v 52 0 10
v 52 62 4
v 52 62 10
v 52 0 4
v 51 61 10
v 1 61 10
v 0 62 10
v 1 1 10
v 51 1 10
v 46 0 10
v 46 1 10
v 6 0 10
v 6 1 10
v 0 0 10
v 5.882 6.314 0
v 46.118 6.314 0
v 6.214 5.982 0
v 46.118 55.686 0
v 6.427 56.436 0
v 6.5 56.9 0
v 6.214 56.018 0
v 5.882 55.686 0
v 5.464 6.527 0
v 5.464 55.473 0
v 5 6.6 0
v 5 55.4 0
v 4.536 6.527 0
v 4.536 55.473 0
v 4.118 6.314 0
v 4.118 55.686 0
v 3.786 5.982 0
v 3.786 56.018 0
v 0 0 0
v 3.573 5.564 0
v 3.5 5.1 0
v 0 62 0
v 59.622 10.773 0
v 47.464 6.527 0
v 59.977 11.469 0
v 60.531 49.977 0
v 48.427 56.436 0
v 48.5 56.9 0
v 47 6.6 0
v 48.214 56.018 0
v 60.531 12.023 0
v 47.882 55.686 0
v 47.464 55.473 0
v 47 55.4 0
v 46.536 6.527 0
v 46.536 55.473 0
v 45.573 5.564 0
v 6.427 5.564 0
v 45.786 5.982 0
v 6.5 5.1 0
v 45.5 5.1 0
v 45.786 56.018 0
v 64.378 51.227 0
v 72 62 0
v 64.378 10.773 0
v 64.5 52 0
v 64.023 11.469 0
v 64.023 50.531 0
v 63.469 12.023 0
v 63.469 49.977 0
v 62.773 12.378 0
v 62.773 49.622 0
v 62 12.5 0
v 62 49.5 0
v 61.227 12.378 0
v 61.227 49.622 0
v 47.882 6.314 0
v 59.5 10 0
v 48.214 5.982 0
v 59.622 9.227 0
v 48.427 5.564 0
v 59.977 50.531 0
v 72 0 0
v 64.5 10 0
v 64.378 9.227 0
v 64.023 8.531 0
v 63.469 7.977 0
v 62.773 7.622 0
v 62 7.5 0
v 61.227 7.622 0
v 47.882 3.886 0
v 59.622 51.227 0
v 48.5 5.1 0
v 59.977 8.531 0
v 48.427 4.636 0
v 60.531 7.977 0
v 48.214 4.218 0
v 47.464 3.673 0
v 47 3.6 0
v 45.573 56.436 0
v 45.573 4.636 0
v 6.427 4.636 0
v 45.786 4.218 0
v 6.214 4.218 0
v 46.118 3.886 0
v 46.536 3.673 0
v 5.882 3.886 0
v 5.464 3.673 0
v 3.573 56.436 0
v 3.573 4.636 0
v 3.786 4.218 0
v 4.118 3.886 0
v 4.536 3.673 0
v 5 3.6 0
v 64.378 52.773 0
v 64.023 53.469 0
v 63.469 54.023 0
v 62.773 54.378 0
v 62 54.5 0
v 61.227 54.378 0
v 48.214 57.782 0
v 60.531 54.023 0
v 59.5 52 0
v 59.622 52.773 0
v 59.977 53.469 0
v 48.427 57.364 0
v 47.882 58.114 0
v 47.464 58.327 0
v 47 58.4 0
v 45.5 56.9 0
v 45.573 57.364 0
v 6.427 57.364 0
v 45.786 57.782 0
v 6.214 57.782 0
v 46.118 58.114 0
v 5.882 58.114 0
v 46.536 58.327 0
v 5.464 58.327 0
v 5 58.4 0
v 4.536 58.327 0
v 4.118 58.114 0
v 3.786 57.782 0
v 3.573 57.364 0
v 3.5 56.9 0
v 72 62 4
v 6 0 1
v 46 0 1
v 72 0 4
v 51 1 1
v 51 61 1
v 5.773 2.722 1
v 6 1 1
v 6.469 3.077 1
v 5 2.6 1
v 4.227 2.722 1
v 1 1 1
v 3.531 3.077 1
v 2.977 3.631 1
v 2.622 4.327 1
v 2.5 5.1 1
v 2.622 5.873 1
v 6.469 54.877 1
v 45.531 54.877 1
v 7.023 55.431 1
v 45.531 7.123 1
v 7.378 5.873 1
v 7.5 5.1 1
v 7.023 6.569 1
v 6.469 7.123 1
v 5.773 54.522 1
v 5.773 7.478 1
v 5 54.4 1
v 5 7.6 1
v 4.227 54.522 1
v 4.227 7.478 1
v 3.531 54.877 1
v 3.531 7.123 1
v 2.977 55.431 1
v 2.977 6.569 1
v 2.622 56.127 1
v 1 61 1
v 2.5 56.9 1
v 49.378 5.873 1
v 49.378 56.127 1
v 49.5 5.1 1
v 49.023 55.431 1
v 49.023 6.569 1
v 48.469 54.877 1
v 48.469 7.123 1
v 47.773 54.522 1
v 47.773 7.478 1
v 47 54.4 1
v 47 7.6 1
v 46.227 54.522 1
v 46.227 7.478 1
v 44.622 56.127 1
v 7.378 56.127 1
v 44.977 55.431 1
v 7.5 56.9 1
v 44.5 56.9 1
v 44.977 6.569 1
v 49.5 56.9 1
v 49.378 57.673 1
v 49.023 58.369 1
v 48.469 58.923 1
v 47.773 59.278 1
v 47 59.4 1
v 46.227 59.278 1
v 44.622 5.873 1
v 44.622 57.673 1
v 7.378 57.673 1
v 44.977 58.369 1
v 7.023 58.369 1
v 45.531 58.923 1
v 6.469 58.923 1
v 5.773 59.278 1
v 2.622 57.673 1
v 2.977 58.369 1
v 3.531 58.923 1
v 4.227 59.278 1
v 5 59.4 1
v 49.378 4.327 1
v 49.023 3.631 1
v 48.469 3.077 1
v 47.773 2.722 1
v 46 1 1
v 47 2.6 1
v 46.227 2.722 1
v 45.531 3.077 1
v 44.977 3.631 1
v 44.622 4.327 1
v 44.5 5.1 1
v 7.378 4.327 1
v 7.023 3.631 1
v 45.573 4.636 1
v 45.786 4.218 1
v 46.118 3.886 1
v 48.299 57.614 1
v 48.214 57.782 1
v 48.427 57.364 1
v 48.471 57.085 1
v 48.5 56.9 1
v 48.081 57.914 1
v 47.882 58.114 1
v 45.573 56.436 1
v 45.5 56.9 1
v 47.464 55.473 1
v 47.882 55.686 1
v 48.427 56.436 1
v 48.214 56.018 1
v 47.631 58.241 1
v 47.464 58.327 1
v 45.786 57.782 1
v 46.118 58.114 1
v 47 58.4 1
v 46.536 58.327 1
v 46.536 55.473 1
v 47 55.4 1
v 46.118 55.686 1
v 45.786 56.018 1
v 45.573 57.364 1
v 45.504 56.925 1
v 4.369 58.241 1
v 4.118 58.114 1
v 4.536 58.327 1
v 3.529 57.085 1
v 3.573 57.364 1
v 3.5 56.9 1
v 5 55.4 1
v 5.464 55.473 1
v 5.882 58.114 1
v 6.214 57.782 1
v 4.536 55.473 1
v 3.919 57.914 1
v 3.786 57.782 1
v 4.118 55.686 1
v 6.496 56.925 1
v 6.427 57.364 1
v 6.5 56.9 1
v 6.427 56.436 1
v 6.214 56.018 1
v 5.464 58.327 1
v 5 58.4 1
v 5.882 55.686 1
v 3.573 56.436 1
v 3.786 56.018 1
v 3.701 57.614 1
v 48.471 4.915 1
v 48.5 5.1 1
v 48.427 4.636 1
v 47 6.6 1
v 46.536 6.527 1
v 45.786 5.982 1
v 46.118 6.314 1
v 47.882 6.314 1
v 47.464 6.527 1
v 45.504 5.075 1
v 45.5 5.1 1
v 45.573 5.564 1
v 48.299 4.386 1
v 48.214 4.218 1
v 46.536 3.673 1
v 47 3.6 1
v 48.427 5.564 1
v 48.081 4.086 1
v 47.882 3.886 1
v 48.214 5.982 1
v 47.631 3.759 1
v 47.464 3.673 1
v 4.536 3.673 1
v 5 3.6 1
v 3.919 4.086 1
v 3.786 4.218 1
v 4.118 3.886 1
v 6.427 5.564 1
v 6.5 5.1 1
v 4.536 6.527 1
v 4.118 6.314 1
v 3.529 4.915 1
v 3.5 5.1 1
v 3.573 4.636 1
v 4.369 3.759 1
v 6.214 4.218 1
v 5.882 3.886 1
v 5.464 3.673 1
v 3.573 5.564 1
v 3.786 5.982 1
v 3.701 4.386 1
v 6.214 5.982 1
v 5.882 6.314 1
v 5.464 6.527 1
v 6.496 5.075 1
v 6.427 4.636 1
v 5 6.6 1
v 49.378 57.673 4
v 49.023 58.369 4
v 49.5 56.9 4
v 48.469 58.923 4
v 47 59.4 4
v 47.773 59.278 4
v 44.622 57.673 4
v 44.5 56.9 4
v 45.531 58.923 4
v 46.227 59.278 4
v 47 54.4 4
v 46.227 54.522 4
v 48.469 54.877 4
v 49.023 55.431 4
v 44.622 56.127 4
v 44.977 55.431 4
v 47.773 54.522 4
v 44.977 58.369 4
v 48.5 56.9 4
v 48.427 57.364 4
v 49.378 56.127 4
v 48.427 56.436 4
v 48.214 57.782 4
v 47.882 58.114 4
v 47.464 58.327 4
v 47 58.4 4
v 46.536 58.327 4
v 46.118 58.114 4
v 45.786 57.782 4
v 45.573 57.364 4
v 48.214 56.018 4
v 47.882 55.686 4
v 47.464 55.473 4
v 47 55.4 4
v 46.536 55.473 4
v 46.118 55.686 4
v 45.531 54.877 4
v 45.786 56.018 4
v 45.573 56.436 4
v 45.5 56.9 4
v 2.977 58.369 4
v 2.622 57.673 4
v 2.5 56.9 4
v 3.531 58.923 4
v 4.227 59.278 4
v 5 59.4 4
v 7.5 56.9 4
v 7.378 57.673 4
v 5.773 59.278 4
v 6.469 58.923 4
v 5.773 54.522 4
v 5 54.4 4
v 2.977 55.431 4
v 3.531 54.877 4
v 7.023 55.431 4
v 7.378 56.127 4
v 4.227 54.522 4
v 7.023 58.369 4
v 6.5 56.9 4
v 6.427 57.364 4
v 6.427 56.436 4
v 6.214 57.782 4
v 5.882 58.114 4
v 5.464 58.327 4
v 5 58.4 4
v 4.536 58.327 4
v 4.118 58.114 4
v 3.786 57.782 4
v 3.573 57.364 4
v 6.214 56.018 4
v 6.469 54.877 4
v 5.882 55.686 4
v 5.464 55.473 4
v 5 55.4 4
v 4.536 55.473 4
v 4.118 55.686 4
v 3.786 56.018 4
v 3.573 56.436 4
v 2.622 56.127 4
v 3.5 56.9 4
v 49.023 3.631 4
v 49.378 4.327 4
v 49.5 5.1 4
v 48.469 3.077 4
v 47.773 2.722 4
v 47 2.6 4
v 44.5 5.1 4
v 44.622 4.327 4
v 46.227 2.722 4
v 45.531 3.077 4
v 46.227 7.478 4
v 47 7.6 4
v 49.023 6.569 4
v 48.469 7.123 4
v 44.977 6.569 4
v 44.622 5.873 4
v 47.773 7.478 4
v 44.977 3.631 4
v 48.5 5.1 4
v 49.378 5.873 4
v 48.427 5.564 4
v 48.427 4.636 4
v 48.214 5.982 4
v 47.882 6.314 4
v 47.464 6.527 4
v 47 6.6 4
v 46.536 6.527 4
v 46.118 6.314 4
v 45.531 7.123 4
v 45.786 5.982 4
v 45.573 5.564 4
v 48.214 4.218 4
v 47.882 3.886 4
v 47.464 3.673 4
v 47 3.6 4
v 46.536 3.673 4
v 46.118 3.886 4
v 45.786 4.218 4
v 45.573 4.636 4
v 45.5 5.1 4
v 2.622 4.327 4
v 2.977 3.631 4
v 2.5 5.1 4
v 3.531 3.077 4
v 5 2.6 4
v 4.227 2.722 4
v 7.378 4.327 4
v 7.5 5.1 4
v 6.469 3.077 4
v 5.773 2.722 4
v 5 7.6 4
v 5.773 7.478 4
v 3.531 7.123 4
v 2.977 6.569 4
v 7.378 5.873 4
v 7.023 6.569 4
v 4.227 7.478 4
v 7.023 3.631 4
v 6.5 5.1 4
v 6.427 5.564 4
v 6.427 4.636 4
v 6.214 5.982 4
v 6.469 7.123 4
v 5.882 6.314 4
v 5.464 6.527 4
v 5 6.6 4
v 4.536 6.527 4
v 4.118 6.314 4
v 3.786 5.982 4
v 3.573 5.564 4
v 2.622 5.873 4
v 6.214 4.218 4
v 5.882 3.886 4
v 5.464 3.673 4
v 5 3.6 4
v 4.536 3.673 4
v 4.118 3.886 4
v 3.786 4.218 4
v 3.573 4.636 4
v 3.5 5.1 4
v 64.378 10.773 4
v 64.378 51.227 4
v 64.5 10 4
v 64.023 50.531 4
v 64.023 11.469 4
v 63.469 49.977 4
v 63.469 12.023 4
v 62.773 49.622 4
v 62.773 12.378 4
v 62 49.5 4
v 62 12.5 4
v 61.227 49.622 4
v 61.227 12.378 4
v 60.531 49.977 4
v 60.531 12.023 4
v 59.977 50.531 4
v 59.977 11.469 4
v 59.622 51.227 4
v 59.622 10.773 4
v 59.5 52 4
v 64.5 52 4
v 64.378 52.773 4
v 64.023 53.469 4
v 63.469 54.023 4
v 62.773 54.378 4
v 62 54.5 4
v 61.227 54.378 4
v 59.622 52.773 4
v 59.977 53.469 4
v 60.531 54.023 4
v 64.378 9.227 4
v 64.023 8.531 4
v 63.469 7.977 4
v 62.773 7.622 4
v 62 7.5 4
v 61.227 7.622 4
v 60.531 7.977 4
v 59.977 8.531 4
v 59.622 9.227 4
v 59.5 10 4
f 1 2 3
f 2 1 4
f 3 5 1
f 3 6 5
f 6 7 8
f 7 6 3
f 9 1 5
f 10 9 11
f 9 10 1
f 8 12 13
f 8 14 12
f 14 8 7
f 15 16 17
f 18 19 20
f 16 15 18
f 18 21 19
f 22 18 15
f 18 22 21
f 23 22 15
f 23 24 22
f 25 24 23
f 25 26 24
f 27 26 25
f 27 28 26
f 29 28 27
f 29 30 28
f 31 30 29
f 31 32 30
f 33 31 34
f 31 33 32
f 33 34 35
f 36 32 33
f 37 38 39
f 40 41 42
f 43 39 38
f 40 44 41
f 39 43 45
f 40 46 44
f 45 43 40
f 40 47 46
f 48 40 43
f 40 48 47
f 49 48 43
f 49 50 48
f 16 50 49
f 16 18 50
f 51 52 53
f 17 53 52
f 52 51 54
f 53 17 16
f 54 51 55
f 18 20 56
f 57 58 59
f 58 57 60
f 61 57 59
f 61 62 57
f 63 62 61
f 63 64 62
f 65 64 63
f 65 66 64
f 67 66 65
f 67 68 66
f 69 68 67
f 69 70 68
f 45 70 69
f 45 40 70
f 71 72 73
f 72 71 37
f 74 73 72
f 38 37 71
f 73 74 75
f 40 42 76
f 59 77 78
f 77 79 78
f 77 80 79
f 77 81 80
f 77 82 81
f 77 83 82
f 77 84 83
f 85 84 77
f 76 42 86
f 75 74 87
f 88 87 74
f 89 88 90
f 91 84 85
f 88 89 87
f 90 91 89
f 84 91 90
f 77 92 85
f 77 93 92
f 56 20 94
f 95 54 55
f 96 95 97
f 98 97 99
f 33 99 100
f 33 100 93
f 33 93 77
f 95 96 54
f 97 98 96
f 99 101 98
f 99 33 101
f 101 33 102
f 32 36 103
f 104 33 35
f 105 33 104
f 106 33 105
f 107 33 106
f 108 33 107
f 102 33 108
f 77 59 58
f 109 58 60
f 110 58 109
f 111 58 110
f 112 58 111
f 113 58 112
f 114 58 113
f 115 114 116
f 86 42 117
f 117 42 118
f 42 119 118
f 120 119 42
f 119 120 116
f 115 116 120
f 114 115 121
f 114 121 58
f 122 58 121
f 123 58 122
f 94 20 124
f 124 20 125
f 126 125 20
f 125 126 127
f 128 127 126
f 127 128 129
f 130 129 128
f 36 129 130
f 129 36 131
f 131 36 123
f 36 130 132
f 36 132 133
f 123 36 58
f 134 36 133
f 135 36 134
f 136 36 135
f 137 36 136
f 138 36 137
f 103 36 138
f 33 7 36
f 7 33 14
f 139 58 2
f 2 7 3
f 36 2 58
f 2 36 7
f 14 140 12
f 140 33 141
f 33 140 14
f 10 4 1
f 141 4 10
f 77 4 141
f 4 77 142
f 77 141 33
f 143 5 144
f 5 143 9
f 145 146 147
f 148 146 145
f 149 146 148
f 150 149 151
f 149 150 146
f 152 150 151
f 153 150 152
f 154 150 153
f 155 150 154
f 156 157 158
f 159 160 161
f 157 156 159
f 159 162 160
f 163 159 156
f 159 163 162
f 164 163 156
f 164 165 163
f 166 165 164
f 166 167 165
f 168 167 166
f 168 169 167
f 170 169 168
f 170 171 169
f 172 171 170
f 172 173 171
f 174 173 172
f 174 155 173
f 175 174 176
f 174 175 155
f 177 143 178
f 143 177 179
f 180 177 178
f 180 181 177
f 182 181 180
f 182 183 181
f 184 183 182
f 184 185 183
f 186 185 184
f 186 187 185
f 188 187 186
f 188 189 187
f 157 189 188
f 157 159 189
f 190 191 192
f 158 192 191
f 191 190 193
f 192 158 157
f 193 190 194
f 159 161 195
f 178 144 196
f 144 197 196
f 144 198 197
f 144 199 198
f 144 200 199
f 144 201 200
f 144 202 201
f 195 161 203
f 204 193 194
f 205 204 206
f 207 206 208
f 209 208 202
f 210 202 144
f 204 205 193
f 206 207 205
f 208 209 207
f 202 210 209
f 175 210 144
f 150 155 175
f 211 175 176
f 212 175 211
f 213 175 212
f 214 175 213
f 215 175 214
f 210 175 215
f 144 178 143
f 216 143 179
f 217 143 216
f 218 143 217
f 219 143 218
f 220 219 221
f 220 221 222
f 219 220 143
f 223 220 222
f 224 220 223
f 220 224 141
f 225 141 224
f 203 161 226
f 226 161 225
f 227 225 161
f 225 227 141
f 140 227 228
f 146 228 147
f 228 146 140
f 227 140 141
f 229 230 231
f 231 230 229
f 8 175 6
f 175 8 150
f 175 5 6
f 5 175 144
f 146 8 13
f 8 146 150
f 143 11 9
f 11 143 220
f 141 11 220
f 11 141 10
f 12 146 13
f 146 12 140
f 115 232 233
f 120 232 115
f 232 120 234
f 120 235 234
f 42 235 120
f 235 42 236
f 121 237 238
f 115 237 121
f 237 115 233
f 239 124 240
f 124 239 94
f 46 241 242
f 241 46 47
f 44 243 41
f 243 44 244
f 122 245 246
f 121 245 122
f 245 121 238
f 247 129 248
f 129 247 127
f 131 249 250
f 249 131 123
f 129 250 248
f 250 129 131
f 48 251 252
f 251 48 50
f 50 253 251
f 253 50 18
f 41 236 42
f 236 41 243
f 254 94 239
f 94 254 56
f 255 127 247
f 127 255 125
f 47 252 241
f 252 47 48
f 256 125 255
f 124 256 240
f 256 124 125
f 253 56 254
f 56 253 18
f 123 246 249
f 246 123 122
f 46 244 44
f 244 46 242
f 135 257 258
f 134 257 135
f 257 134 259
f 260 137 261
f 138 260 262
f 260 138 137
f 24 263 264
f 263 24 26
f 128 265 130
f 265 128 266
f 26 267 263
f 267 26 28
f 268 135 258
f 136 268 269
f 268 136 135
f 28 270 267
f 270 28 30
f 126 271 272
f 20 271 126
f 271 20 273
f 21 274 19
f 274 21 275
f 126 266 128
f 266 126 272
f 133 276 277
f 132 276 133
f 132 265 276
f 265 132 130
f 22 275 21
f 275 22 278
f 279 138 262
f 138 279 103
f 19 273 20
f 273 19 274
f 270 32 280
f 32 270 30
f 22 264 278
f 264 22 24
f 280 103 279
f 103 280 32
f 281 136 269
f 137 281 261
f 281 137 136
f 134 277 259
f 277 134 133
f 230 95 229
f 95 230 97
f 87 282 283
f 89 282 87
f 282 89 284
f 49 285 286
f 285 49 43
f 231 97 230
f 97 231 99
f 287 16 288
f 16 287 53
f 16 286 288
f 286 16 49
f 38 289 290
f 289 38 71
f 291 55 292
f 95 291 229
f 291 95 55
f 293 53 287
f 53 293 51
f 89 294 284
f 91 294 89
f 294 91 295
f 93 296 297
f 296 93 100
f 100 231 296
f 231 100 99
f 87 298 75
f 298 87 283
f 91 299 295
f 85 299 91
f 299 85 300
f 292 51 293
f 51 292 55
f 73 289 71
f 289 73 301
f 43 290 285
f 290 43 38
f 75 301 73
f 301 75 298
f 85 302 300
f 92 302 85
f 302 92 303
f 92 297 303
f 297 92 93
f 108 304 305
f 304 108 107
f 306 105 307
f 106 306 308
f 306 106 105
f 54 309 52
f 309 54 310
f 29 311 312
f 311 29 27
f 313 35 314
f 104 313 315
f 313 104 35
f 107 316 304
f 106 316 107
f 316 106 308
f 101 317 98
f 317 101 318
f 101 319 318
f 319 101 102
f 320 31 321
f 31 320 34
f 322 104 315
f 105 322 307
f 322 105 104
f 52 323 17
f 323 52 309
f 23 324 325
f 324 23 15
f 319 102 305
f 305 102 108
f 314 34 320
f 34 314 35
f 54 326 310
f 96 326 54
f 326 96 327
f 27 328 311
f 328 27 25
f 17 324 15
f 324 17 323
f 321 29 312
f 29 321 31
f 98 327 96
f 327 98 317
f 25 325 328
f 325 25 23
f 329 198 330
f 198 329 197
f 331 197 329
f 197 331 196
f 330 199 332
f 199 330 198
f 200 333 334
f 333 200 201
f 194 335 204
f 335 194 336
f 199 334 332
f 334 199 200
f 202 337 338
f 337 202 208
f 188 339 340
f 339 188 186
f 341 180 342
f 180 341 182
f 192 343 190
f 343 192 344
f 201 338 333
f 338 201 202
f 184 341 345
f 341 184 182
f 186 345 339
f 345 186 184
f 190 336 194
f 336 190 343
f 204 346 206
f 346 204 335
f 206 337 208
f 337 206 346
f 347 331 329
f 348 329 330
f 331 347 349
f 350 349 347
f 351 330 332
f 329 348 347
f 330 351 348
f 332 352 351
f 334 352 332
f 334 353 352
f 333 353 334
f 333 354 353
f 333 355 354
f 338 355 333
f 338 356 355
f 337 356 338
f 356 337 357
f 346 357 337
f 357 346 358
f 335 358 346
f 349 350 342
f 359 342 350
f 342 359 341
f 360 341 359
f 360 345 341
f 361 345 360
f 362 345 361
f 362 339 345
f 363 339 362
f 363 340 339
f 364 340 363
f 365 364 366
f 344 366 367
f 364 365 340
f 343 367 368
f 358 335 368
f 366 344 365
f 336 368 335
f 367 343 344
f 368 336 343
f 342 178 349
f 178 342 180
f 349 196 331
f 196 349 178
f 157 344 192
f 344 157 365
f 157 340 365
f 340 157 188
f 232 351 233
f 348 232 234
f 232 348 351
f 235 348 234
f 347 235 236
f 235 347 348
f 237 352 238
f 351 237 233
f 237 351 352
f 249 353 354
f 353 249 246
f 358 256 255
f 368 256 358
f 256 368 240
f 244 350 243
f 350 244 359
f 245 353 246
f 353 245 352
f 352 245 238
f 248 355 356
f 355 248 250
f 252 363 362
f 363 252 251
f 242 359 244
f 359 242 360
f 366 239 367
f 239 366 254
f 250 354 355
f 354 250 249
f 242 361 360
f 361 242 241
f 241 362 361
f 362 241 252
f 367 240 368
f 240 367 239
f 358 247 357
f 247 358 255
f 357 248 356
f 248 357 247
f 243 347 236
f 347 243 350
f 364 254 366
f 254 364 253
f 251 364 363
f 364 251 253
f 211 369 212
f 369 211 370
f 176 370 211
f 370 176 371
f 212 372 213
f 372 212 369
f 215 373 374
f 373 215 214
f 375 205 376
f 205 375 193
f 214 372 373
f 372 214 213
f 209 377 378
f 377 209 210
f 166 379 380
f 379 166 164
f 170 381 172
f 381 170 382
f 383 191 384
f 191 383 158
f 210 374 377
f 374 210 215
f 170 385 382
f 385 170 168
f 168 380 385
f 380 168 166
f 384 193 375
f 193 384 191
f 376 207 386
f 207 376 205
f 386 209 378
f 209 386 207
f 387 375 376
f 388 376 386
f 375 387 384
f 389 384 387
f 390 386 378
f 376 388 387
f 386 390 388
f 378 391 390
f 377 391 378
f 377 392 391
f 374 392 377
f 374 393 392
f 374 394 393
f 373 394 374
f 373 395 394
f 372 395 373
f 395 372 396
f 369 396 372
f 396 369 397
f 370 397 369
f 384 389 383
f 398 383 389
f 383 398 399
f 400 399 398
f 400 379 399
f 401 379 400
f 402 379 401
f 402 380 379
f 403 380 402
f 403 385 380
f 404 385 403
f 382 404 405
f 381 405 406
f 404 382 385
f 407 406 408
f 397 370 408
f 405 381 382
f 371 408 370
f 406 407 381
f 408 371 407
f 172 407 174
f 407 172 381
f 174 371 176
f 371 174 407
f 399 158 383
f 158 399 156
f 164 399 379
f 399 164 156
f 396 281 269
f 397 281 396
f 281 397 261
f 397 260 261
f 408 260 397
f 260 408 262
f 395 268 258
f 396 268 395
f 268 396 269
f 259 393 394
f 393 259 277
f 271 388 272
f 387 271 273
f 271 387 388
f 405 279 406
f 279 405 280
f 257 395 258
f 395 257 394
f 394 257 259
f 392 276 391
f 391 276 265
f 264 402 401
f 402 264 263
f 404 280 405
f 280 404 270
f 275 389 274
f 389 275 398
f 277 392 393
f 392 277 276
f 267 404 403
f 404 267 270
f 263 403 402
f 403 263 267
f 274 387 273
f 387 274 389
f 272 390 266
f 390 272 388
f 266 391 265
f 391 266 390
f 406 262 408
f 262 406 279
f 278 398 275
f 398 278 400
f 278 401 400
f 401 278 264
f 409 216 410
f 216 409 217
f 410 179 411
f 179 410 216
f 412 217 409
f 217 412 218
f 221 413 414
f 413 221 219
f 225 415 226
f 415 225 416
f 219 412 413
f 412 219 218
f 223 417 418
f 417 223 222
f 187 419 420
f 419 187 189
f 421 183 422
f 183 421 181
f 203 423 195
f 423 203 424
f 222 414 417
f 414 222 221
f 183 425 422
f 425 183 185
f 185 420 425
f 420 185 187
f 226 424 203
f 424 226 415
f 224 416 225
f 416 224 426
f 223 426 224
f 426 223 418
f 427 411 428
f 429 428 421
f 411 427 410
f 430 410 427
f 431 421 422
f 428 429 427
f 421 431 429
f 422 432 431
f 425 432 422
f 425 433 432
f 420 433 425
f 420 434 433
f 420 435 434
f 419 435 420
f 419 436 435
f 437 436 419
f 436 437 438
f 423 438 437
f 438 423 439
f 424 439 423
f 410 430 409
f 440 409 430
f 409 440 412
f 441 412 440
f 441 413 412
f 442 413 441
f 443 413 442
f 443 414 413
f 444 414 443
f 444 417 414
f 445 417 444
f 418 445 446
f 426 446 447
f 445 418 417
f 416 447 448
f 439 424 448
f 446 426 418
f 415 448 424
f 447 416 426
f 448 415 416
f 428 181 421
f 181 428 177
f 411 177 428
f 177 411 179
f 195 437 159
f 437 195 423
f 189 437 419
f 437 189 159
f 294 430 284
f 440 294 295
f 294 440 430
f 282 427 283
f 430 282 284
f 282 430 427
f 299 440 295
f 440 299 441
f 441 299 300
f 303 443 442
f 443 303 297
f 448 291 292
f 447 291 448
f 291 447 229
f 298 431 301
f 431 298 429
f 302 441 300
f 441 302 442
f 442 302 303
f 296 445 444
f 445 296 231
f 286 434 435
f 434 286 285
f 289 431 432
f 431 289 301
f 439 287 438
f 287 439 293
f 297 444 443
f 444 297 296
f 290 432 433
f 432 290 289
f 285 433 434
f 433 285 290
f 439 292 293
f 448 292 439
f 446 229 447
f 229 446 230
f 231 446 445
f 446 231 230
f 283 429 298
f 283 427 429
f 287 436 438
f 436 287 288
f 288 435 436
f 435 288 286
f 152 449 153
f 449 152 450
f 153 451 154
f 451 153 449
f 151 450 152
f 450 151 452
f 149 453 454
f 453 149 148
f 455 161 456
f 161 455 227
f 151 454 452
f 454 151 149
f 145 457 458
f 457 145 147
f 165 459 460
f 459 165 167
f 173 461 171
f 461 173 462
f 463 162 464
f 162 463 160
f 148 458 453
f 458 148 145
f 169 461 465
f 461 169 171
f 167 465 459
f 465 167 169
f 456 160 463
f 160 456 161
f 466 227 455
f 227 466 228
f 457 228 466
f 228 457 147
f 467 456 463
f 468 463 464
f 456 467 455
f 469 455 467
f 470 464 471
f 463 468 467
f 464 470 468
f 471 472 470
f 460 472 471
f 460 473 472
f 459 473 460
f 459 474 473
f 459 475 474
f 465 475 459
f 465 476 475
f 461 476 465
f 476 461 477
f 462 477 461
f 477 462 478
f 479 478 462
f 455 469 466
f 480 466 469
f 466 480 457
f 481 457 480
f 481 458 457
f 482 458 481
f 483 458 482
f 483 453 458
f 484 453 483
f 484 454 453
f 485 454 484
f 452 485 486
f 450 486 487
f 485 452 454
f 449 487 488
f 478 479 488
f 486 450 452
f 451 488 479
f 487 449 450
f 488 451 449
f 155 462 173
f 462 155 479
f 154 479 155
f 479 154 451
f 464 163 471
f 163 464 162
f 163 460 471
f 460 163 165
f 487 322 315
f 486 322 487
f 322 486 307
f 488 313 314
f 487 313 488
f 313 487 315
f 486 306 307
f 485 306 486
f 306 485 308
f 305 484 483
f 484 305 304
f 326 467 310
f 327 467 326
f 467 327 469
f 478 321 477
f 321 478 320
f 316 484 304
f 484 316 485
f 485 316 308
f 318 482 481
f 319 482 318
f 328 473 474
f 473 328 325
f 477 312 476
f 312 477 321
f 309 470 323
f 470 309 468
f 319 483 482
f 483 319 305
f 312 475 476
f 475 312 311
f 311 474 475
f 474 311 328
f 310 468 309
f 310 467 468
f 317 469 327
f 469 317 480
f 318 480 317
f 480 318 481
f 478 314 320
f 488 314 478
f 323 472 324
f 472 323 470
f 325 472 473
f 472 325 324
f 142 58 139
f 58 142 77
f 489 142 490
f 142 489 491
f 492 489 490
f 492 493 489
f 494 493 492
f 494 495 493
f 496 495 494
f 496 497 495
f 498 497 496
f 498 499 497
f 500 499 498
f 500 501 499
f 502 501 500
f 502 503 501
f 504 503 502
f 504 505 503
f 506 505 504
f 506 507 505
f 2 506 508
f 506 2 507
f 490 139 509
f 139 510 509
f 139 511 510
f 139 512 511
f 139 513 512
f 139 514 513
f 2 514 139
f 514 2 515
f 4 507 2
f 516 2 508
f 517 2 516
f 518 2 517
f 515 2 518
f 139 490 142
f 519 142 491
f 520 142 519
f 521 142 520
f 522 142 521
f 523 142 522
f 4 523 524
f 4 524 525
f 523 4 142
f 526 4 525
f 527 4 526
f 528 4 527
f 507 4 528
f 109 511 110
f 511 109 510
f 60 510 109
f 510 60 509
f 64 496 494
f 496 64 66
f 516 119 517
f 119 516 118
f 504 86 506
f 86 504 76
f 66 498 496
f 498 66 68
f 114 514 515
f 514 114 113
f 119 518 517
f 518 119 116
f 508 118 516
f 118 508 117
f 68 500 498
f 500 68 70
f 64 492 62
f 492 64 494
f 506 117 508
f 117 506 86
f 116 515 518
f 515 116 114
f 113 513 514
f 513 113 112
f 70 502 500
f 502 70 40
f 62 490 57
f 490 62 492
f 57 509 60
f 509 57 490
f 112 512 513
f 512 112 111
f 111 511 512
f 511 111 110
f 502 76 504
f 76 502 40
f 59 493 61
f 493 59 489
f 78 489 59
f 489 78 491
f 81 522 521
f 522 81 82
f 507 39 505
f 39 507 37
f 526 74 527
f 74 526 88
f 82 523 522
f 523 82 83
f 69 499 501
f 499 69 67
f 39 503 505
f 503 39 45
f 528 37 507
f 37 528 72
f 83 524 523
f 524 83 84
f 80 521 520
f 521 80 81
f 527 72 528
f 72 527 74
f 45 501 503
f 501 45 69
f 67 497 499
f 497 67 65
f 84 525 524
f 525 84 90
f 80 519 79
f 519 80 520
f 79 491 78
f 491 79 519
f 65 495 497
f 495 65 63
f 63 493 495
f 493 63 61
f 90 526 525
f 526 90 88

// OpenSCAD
// 38
// 48
$fn=20;

module mount() {
    translate([(50+2)/2, (60+2)/2]) {
        difference() {
            translate([0, 0, 10/2]) cube([50+2, 60+2, 10], center=true);
            translate([0, 0, 10/2+1/2]) cube([50, 60, 10-1], center=true);
            translate([0, -0.5, 10/2+1/2]) cube([40, 61, 10-1], center=true);
            //cube([50-4, 60-5, 2], center=true);
            hole();
            mirror([1, 0, 0]) hole();
            mirror([0, 1, 0]) hole();
            mirror([1, 0, 0]) mirror([0, 1, 0]) hole();
        }

        x();
        mirror([1, 0, 0]) x();
        mirror([0, 1, 0]) x();
        mirror([1, 0, 0]) mirror([0, 1, 0]) x();
    }
    
    module x() translate([50/2-2.5-3/2, 60/2-2.6-3/2, 1]) difference() {
        cylinder(d=3+2, h=3);
        cylinder(d=3, h=3);
    }

    module hole() translate([50/2-2.5-3/2, 60/2-2.6-3/2, 0]) 
        cylinder(d=3, h=3);
}

mount();
translate([50+2, 0, 0]) difference() {
    cube([20,60+2, 4]);
    //translate([20/2, (60+2)/2, 0]) cylinder(d=5, h=4);
    translate([20/2, (60+2)-10, 0]) cylinder(d=5, h=4);
    translate([20/2, 10, 0]) cylinder(d=5, h=4);
}
    
